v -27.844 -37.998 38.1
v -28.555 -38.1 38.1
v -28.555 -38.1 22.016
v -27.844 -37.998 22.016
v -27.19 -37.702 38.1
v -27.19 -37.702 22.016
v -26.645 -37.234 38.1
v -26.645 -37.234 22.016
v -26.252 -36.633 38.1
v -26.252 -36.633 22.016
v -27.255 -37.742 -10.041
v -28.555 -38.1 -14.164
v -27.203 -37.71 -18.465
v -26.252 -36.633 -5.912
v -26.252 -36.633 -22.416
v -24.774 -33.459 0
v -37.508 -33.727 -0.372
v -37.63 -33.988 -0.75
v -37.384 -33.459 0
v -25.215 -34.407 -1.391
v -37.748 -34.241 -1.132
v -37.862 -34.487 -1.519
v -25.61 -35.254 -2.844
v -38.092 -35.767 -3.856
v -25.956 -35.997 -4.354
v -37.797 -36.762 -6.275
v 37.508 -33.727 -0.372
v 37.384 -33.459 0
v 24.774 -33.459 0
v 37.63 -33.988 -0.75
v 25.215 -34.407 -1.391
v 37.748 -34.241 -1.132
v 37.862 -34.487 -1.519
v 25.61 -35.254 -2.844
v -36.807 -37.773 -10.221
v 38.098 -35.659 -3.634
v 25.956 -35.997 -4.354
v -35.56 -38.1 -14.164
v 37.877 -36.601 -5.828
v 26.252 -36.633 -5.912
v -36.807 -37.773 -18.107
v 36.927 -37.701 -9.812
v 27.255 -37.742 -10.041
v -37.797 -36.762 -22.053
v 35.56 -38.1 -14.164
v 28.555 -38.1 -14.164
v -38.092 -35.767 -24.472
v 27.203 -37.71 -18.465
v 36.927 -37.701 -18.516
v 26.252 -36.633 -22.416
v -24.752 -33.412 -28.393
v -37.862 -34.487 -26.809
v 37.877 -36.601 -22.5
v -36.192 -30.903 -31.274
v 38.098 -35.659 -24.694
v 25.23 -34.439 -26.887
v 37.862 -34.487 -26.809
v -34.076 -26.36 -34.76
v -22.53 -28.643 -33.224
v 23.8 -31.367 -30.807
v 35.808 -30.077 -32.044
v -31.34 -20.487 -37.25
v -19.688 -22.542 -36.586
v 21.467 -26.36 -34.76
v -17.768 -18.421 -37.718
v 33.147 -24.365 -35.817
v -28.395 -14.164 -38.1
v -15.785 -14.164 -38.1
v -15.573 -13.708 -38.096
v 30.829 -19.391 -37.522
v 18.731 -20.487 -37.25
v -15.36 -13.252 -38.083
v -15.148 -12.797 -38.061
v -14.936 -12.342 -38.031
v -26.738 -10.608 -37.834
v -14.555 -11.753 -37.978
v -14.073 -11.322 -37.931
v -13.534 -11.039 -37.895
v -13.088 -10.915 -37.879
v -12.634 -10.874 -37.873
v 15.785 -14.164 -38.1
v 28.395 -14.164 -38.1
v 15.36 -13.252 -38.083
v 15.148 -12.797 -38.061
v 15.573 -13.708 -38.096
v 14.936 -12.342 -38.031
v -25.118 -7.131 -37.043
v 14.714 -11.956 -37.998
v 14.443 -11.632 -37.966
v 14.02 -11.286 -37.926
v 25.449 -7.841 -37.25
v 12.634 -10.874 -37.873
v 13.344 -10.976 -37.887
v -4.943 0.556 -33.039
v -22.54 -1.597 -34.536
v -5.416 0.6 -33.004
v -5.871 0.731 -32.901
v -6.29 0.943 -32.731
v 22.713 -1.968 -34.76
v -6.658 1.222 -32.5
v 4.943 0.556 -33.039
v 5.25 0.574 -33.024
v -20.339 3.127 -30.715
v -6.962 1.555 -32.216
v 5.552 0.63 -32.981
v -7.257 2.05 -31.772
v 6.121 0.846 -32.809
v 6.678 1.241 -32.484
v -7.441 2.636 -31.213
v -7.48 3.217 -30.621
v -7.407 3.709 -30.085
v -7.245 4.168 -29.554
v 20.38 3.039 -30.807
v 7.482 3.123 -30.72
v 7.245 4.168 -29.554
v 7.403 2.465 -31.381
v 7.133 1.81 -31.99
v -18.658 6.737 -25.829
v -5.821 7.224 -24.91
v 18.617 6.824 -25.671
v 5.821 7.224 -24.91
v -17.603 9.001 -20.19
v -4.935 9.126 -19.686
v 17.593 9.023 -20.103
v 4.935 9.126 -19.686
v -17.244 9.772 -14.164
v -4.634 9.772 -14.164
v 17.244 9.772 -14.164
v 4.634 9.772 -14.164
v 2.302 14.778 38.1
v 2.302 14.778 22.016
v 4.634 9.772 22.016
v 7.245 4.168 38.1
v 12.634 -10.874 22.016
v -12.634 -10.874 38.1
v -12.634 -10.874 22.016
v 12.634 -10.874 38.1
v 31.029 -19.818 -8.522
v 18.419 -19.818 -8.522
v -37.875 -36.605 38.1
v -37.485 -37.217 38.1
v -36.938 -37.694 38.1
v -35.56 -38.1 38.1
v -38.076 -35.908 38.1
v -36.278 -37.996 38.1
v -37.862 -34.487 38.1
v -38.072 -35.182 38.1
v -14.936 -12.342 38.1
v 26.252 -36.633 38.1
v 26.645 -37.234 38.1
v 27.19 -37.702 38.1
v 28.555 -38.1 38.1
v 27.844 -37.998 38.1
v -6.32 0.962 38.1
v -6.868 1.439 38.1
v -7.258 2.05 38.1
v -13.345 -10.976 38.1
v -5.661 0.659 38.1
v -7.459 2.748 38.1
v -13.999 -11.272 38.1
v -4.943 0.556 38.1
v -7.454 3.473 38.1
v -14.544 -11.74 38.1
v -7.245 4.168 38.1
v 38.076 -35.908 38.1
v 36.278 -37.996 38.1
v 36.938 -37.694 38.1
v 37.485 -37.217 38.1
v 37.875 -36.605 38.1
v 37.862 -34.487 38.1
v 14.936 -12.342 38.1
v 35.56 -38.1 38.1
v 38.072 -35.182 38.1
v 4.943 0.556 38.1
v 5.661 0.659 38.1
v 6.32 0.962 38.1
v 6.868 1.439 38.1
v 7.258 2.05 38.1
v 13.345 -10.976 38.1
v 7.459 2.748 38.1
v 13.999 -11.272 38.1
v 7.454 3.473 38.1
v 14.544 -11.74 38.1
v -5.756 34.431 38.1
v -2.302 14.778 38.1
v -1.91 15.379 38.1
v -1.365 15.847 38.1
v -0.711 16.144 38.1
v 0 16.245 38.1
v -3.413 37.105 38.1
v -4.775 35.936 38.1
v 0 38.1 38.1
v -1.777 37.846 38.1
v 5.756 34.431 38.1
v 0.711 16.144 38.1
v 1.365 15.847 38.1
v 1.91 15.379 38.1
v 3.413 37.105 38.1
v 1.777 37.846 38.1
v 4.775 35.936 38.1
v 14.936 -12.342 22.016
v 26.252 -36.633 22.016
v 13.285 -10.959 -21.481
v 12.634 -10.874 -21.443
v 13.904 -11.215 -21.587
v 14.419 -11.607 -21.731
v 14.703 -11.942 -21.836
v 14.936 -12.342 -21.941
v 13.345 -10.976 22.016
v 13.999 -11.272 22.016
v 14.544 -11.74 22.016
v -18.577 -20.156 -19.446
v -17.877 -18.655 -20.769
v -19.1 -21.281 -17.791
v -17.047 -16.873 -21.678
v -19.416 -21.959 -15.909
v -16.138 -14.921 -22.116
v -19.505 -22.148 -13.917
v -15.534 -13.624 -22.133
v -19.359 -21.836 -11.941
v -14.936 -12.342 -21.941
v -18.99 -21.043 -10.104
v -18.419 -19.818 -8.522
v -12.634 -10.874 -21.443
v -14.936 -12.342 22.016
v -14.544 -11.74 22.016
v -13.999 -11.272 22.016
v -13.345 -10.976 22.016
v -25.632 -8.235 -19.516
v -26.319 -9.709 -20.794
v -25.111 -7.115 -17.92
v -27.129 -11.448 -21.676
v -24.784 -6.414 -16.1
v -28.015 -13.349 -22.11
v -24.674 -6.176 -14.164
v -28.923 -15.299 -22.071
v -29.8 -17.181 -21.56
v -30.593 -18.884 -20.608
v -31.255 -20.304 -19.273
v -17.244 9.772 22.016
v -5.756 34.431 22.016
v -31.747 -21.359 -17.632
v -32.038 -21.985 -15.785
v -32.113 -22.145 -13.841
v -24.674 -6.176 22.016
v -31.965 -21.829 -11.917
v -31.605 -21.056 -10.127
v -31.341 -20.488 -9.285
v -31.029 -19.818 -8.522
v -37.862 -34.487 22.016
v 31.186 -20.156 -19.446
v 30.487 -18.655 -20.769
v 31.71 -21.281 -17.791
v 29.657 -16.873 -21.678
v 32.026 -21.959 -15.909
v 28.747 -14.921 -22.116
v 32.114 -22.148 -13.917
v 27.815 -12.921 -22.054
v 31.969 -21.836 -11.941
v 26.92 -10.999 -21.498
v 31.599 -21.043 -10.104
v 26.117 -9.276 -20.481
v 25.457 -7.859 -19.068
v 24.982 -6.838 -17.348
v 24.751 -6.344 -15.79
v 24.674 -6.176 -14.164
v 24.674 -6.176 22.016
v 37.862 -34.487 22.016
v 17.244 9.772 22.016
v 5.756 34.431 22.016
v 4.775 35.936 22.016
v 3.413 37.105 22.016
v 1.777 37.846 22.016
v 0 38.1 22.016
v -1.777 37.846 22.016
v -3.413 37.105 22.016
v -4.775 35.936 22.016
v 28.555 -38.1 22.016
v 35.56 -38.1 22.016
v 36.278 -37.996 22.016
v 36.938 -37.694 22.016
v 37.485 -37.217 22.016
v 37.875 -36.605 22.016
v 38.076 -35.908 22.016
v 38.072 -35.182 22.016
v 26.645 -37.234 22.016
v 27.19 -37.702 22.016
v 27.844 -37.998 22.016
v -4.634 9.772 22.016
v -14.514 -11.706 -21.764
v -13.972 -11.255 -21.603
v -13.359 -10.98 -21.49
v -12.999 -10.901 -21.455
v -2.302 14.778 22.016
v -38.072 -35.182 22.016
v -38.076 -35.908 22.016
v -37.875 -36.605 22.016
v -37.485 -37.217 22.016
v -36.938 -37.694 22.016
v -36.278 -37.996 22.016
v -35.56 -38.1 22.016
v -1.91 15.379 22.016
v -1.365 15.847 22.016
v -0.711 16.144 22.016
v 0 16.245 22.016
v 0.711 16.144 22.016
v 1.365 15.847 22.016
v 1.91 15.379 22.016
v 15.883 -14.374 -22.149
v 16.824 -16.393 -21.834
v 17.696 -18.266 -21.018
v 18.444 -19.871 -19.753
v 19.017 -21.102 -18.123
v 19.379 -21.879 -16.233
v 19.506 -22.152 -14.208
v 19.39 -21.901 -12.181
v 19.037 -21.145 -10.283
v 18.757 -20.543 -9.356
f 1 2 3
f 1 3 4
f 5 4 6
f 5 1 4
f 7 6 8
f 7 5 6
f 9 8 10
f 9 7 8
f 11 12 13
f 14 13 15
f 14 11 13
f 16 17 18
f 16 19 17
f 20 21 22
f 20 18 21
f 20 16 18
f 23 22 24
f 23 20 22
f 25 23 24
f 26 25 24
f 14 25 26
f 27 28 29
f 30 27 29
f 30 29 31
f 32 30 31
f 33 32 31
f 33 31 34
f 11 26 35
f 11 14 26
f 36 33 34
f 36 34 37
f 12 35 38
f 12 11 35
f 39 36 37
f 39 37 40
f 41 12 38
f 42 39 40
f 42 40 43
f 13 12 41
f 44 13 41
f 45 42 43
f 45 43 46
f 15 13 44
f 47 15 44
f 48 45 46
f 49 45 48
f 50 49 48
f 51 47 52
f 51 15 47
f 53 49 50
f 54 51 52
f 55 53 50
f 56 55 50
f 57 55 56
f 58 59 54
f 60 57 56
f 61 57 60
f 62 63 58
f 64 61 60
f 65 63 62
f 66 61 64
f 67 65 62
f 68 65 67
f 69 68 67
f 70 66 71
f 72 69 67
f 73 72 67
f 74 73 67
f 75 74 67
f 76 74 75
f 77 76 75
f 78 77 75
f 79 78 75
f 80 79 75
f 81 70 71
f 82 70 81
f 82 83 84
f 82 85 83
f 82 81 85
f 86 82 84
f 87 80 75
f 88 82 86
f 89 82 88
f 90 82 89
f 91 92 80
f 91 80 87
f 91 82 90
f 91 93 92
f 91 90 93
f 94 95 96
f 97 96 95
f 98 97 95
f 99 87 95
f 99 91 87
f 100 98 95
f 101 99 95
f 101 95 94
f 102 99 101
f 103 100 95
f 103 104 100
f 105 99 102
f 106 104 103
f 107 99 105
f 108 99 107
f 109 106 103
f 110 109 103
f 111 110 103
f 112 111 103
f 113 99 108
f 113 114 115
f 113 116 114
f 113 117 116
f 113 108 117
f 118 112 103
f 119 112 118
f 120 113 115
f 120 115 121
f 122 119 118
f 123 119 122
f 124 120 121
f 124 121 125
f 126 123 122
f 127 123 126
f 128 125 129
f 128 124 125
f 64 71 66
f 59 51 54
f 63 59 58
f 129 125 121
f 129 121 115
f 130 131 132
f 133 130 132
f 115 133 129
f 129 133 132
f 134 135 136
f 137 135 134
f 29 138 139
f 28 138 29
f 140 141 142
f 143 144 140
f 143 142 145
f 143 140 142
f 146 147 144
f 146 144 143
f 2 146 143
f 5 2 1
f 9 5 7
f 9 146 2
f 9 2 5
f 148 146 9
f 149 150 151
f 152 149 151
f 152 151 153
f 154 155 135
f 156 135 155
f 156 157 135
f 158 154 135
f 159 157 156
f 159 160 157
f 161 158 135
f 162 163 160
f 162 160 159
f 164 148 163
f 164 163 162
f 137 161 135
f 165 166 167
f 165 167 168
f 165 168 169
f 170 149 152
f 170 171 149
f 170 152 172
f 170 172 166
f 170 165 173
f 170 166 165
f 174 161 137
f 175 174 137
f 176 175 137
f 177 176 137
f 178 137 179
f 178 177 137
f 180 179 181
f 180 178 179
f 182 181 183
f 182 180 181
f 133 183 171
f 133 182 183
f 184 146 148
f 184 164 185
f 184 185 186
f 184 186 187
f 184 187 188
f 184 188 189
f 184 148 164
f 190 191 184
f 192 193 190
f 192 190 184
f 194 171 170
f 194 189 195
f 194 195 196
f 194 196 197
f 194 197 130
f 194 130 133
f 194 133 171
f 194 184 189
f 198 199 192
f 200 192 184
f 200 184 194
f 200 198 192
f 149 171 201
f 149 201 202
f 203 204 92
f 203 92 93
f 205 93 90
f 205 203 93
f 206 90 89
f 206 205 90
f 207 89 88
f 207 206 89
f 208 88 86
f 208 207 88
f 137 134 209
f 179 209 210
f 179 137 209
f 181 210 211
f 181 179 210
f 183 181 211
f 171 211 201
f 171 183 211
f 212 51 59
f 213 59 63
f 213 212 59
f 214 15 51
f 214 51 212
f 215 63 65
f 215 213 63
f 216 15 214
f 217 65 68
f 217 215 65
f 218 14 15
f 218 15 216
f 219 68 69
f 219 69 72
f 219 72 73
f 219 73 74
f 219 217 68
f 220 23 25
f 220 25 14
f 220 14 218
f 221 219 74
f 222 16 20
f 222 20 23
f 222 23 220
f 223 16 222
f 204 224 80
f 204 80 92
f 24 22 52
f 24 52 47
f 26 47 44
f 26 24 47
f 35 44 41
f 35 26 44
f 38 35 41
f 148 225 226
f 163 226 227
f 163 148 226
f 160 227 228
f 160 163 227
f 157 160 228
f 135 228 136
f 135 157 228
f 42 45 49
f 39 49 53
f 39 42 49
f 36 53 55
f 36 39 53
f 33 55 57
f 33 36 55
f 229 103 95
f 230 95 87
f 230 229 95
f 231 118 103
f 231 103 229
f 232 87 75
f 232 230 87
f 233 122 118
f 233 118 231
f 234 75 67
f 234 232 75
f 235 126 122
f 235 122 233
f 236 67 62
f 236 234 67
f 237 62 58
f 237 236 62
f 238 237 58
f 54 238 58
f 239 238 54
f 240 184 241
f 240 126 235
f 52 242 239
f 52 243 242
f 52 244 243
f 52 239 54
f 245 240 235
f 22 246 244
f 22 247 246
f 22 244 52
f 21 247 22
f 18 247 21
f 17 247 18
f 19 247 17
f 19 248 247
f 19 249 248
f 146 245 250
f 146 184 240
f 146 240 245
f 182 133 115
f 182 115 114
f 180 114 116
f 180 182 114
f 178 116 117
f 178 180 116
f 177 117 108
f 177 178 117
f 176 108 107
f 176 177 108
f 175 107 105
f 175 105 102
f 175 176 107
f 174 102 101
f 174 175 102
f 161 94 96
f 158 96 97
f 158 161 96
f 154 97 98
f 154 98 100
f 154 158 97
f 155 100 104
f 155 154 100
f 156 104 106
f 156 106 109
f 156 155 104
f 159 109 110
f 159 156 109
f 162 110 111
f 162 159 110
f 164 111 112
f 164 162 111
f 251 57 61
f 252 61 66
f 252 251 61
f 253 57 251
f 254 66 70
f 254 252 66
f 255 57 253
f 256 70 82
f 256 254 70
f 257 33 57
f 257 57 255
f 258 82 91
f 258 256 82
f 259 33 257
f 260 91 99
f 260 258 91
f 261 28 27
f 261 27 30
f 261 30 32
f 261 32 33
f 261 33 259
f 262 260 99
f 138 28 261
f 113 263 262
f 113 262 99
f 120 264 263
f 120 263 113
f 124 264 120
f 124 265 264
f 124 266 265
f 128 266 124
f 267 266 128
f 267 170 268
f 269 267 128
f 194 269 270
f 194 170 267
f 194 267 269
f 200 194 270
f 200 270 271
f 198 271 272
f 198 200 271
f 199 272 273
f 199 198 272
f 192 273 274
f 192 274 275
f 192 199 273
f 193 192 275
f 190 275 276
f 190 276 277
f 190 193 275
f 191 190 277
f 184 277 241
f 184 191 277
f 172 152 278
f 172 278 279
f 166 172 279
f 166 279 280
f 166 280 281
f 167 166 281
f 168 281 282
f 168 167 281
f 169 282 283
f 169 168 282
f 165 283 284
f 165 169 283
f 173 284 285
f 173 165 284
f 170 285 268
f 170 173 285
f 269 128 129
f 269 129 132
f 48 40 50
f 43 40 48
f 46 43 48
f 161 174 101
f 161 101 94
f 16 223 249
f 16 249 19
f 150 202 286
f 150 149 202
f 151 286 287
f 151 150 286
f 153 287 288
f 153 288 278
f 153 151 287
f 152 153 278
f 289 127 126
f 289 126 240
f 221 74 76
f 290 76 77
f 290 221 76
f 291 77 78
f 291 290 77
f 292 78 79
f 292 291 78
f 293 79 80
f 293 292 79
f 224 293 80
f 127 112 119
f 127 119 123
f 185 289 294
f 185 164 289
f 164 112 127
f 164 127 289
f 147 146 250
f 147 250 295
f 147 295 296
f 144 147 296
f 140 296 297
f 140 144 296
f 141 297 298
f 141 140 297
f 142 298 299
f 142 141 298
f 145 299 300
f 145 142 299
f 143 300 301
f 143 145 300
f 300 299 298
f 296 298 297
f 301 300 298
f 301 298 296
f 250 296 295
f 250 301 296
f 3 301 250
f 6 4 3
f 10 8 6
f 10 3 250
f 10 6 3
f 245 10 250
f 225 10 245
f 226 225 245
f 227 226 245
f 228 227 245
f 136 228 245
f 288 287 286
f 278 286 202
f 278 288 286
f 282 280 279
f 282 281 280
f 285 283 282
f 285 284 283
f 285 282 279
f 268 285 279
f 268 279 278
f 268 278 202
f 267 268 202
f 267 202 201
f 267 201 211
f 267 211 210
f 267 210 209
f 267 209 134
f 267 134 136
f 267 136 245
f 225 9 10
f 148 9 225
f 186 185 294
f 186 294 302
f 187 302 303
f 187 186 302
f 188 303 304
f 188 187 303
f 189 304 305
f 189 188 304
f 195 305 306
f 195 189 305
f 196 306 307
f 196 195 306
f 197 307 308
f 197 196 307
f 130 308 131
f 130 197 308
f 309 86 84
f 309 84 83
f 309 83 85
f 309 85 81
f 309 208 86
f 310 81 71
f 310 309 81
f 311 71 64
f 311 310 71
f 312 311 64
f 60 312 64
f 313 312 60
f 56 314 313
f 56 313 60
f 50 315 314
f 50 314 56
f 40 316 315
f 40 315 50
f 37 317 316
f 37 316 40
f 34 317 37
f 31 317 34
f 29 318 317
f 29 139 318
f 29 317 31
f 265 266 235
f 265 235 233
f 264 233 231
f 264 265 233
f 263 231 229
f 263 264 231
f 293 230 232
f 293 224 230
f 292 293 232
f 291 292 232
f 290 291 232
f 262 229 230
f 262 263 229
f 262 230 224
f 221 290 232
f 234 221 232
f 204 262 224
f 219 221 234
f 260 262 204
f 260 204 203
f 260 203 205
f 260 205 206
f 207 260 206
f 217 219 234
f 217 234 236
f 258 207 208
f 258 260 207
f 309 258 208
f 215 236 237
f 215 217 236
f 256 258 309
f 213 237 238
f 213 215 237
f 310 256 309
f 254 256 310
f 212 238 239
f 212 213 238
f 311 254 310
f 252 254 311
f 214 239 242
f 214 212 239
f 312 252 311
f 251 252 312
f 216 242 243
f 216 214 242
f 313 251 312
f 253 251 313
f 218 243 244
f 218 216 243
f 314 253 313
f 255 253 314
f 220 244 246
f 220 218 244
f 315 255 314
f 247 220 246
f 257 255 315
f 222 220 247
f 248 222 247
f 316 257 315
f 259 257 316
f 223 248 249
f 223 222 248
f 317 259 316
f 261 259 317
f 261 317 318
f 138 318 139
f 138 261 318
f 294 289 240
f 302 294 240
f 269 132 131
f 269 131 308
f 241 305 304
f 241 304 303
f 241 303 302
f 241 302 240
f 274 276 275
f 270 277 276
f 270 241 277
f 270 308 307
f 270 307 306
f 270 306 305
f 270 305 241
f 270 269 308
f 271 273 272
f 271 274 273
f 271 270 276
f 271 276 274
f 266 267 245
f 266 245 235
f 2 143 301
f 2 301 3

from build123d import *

# Parameters (mm, degrees)
F1_DEPTH = 38.1
F4_DEPTH = 63.5


with BuildPart() as f1:
    # F0 (on Top) → F1 (new body, symmetric)
    with BuildSketch(Plane.XY):
        with BuildLine():
            Line((37.8624187806, -34.487401399), (5.7560469514, 34.4314965026))
            ThreePointArc((5.7560469514, 34.4314965026), (0, 38.1), (-5.7560469514, 34.4314965026))
            Line((-5.7560469514, 34.4314965026), (-37.8624187806, -34.487401399))
            ThreePointArc((-37.8624187806, -34.487401399), (-37.7019617698, -36.9251372739), (-35.56, -38.1))
            Line((-35.56, -38.1), (-28.5547583227, -38.1))
            ThreePointArc((-28.5547583227, -38.1), (-27.1896210488, -37.7019617698), (-26.2523395422, -36.632598601))
            Line((-26.2523395422, -36.632598601), (-14.9362832259, -12.3417776368))
            ThreePointArc((-14.9362832259, -12.3417776368), (-13.9990017193, -11.2724144681), (-12.6338644453, -10.8743762379))
            Line((-12.6338644453, -10.8743762379), (12.6338644453, -10.8743762379))
            ThreePointArc((12.6338644453, -10.8743762379), (13.9990017193, -11.2724144681), (14.9362832259, -12.3417776368))
            Line((14.9362832259, -12.3417776368), (26.2523395422, -36.632598601))
            ThreePointArc((26.2523395422, -36.632598601), (27.1896210488, -37.7019617698), (28.5547583227, -38.1))
            Line((28.5547583227, -38.1), (35.56, -38.1))
            ThreePointArc((35.56, -38.1), (37.7019617698, -36.9251372739), (37.8624187806, -34.487401399))
        make_face()
        with BuildLine():
            ThreePointArc((-2.3024187806, 14.7778239937), (0, 16.2452253927), (2.3024187806, 14.7778239937))
            Line((2.3024187806, 14.7778239937), (7.2449791708, 4.1682223632))
            ThreePointArc((7.2449791708, 4.1682223632), (7.0845221601, 1.7304864882), (4.9425603903, 0.5556237621))
            Line((4.9425603903, 0.5556237621), (-4.9425603903, 0.5556237621))
            ThreePointArc((-4.9425603903, 0.5556237621), (-7.0845221601, 1.7304864882), (-7.2449791708, 4.1682223632))
            Line((-7.2449791708, 4.1682223632), (-2.3024187806, 14.7778239937))
        make_face(mode=Mode.SUBTRACT)
    extrude(amount=F1_DEPTH, both=True)

    # F3 (on Right) → F4 (intersect, symmetric)
    with BuildSketch(Plane.YZ):
        with BuildLine():
            Line((38.1, 38.1), (-38.1, 38.1))
            Line((-38.1, 38.1), (-38.1, 22.0156293362))
            Line((-38.1, 22.0156293362), (-6.1763821984, 22.0156293362))
            Line((-6.1763821984, 22.0156293362), (-6.1763821984, -14.164009311))
            ThreePointArc((-6.1763821984, -14.164009311), (-17.2167607386, -21.5452622947), (-19.8182046927, -8.5220006727))
            Line((-19.8182046927, -8.5220006727), (-33.4594100714, 0))
            ThreePointArc((-33.4594100714, 0), (-21.6164289624, -36.9102857448), (9.7719813781, -14.164009311))
            Line((9.7719813781, -14.164009311), (9.7719813781, 22.0156293362))
            Line((9.7719813781, 22.0156293362), (38.1, 22.0156293362))
            Line((38.1, 22.0156293362), (38.1, 38.1))
        make_face()
    extrude(amount=F4_DEPTH, both=True, mode=Mode.INTERSECT)


solid = f1.part
